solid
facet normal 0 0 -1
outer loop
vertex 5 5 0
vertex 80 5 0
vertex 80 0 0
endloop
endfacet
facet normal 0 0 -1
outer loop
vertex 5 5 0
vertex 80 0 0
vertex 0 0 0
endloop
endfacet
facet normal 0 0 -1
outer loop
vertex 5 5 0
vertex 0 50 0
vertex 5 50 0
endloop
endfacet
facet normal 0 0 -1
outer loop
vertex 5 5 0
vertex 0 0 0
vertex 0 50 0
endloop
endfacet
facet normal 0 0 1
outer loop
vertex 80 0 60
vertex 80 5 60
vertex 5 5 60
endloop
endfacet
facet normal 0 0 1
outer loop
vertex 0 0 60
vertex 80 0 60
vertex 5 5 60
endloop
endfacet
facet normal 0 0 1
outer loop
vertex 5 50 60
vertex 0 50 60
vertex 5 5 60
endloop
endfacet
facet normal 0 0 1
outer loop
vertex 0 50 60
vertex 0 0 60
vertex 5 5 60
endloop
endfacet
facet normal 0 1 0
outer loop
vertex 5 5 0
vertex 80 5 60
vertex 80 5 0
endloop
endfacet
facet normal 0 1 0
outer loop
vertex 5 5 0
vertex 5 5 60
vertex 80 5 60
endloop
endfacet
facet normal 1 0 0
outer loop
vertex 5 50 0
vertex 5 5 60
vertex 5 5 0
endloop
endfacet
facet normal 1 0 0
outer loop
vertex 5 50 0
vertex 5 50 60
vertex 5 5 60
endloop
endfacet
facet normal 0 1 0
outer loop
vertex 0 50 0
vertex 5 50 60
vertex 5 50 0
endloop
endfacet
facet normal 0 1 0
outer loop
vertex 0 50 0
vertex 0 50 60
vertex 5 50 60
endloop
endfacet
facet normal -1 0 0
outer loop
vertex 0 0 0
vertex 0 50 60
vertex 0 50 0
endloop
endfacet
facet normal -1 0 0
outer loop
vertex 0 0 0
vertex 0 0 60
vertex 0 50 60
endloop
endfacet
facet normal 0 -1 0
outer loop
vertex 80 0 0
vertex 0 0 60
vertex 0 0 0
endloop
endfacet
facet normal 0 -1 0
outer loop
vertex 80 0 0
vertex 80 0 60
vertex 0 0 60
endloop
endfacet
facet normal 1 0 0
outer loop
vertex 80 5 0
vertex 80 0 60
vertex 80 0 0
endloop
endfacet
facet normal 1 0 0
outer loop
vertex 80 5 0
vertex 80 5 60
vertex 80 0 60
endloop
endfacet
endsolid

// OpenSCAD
$fn = 32;

// ----------------------------------------------------------------------
// Structural section: angle 80 x 50 mm
// ----------------------------------------------------------------------

// --- parameters (mm) ---
sec_w = 80;               // leg width, X
sec_h = 50;               // leg height, Y
flange_t = 5;             // leg thickness
plate_t = 60;             // cut length, Z (extrusion height)

profile = [[0, 0], [80, 0], [80, 5], [5, 5], [5, 50], [0, 50]];  // primary outline, 6 points, counter clockwise

// --- the one profile operation ---
linear_extrude(height = plate_t) polygon(points = profile);
